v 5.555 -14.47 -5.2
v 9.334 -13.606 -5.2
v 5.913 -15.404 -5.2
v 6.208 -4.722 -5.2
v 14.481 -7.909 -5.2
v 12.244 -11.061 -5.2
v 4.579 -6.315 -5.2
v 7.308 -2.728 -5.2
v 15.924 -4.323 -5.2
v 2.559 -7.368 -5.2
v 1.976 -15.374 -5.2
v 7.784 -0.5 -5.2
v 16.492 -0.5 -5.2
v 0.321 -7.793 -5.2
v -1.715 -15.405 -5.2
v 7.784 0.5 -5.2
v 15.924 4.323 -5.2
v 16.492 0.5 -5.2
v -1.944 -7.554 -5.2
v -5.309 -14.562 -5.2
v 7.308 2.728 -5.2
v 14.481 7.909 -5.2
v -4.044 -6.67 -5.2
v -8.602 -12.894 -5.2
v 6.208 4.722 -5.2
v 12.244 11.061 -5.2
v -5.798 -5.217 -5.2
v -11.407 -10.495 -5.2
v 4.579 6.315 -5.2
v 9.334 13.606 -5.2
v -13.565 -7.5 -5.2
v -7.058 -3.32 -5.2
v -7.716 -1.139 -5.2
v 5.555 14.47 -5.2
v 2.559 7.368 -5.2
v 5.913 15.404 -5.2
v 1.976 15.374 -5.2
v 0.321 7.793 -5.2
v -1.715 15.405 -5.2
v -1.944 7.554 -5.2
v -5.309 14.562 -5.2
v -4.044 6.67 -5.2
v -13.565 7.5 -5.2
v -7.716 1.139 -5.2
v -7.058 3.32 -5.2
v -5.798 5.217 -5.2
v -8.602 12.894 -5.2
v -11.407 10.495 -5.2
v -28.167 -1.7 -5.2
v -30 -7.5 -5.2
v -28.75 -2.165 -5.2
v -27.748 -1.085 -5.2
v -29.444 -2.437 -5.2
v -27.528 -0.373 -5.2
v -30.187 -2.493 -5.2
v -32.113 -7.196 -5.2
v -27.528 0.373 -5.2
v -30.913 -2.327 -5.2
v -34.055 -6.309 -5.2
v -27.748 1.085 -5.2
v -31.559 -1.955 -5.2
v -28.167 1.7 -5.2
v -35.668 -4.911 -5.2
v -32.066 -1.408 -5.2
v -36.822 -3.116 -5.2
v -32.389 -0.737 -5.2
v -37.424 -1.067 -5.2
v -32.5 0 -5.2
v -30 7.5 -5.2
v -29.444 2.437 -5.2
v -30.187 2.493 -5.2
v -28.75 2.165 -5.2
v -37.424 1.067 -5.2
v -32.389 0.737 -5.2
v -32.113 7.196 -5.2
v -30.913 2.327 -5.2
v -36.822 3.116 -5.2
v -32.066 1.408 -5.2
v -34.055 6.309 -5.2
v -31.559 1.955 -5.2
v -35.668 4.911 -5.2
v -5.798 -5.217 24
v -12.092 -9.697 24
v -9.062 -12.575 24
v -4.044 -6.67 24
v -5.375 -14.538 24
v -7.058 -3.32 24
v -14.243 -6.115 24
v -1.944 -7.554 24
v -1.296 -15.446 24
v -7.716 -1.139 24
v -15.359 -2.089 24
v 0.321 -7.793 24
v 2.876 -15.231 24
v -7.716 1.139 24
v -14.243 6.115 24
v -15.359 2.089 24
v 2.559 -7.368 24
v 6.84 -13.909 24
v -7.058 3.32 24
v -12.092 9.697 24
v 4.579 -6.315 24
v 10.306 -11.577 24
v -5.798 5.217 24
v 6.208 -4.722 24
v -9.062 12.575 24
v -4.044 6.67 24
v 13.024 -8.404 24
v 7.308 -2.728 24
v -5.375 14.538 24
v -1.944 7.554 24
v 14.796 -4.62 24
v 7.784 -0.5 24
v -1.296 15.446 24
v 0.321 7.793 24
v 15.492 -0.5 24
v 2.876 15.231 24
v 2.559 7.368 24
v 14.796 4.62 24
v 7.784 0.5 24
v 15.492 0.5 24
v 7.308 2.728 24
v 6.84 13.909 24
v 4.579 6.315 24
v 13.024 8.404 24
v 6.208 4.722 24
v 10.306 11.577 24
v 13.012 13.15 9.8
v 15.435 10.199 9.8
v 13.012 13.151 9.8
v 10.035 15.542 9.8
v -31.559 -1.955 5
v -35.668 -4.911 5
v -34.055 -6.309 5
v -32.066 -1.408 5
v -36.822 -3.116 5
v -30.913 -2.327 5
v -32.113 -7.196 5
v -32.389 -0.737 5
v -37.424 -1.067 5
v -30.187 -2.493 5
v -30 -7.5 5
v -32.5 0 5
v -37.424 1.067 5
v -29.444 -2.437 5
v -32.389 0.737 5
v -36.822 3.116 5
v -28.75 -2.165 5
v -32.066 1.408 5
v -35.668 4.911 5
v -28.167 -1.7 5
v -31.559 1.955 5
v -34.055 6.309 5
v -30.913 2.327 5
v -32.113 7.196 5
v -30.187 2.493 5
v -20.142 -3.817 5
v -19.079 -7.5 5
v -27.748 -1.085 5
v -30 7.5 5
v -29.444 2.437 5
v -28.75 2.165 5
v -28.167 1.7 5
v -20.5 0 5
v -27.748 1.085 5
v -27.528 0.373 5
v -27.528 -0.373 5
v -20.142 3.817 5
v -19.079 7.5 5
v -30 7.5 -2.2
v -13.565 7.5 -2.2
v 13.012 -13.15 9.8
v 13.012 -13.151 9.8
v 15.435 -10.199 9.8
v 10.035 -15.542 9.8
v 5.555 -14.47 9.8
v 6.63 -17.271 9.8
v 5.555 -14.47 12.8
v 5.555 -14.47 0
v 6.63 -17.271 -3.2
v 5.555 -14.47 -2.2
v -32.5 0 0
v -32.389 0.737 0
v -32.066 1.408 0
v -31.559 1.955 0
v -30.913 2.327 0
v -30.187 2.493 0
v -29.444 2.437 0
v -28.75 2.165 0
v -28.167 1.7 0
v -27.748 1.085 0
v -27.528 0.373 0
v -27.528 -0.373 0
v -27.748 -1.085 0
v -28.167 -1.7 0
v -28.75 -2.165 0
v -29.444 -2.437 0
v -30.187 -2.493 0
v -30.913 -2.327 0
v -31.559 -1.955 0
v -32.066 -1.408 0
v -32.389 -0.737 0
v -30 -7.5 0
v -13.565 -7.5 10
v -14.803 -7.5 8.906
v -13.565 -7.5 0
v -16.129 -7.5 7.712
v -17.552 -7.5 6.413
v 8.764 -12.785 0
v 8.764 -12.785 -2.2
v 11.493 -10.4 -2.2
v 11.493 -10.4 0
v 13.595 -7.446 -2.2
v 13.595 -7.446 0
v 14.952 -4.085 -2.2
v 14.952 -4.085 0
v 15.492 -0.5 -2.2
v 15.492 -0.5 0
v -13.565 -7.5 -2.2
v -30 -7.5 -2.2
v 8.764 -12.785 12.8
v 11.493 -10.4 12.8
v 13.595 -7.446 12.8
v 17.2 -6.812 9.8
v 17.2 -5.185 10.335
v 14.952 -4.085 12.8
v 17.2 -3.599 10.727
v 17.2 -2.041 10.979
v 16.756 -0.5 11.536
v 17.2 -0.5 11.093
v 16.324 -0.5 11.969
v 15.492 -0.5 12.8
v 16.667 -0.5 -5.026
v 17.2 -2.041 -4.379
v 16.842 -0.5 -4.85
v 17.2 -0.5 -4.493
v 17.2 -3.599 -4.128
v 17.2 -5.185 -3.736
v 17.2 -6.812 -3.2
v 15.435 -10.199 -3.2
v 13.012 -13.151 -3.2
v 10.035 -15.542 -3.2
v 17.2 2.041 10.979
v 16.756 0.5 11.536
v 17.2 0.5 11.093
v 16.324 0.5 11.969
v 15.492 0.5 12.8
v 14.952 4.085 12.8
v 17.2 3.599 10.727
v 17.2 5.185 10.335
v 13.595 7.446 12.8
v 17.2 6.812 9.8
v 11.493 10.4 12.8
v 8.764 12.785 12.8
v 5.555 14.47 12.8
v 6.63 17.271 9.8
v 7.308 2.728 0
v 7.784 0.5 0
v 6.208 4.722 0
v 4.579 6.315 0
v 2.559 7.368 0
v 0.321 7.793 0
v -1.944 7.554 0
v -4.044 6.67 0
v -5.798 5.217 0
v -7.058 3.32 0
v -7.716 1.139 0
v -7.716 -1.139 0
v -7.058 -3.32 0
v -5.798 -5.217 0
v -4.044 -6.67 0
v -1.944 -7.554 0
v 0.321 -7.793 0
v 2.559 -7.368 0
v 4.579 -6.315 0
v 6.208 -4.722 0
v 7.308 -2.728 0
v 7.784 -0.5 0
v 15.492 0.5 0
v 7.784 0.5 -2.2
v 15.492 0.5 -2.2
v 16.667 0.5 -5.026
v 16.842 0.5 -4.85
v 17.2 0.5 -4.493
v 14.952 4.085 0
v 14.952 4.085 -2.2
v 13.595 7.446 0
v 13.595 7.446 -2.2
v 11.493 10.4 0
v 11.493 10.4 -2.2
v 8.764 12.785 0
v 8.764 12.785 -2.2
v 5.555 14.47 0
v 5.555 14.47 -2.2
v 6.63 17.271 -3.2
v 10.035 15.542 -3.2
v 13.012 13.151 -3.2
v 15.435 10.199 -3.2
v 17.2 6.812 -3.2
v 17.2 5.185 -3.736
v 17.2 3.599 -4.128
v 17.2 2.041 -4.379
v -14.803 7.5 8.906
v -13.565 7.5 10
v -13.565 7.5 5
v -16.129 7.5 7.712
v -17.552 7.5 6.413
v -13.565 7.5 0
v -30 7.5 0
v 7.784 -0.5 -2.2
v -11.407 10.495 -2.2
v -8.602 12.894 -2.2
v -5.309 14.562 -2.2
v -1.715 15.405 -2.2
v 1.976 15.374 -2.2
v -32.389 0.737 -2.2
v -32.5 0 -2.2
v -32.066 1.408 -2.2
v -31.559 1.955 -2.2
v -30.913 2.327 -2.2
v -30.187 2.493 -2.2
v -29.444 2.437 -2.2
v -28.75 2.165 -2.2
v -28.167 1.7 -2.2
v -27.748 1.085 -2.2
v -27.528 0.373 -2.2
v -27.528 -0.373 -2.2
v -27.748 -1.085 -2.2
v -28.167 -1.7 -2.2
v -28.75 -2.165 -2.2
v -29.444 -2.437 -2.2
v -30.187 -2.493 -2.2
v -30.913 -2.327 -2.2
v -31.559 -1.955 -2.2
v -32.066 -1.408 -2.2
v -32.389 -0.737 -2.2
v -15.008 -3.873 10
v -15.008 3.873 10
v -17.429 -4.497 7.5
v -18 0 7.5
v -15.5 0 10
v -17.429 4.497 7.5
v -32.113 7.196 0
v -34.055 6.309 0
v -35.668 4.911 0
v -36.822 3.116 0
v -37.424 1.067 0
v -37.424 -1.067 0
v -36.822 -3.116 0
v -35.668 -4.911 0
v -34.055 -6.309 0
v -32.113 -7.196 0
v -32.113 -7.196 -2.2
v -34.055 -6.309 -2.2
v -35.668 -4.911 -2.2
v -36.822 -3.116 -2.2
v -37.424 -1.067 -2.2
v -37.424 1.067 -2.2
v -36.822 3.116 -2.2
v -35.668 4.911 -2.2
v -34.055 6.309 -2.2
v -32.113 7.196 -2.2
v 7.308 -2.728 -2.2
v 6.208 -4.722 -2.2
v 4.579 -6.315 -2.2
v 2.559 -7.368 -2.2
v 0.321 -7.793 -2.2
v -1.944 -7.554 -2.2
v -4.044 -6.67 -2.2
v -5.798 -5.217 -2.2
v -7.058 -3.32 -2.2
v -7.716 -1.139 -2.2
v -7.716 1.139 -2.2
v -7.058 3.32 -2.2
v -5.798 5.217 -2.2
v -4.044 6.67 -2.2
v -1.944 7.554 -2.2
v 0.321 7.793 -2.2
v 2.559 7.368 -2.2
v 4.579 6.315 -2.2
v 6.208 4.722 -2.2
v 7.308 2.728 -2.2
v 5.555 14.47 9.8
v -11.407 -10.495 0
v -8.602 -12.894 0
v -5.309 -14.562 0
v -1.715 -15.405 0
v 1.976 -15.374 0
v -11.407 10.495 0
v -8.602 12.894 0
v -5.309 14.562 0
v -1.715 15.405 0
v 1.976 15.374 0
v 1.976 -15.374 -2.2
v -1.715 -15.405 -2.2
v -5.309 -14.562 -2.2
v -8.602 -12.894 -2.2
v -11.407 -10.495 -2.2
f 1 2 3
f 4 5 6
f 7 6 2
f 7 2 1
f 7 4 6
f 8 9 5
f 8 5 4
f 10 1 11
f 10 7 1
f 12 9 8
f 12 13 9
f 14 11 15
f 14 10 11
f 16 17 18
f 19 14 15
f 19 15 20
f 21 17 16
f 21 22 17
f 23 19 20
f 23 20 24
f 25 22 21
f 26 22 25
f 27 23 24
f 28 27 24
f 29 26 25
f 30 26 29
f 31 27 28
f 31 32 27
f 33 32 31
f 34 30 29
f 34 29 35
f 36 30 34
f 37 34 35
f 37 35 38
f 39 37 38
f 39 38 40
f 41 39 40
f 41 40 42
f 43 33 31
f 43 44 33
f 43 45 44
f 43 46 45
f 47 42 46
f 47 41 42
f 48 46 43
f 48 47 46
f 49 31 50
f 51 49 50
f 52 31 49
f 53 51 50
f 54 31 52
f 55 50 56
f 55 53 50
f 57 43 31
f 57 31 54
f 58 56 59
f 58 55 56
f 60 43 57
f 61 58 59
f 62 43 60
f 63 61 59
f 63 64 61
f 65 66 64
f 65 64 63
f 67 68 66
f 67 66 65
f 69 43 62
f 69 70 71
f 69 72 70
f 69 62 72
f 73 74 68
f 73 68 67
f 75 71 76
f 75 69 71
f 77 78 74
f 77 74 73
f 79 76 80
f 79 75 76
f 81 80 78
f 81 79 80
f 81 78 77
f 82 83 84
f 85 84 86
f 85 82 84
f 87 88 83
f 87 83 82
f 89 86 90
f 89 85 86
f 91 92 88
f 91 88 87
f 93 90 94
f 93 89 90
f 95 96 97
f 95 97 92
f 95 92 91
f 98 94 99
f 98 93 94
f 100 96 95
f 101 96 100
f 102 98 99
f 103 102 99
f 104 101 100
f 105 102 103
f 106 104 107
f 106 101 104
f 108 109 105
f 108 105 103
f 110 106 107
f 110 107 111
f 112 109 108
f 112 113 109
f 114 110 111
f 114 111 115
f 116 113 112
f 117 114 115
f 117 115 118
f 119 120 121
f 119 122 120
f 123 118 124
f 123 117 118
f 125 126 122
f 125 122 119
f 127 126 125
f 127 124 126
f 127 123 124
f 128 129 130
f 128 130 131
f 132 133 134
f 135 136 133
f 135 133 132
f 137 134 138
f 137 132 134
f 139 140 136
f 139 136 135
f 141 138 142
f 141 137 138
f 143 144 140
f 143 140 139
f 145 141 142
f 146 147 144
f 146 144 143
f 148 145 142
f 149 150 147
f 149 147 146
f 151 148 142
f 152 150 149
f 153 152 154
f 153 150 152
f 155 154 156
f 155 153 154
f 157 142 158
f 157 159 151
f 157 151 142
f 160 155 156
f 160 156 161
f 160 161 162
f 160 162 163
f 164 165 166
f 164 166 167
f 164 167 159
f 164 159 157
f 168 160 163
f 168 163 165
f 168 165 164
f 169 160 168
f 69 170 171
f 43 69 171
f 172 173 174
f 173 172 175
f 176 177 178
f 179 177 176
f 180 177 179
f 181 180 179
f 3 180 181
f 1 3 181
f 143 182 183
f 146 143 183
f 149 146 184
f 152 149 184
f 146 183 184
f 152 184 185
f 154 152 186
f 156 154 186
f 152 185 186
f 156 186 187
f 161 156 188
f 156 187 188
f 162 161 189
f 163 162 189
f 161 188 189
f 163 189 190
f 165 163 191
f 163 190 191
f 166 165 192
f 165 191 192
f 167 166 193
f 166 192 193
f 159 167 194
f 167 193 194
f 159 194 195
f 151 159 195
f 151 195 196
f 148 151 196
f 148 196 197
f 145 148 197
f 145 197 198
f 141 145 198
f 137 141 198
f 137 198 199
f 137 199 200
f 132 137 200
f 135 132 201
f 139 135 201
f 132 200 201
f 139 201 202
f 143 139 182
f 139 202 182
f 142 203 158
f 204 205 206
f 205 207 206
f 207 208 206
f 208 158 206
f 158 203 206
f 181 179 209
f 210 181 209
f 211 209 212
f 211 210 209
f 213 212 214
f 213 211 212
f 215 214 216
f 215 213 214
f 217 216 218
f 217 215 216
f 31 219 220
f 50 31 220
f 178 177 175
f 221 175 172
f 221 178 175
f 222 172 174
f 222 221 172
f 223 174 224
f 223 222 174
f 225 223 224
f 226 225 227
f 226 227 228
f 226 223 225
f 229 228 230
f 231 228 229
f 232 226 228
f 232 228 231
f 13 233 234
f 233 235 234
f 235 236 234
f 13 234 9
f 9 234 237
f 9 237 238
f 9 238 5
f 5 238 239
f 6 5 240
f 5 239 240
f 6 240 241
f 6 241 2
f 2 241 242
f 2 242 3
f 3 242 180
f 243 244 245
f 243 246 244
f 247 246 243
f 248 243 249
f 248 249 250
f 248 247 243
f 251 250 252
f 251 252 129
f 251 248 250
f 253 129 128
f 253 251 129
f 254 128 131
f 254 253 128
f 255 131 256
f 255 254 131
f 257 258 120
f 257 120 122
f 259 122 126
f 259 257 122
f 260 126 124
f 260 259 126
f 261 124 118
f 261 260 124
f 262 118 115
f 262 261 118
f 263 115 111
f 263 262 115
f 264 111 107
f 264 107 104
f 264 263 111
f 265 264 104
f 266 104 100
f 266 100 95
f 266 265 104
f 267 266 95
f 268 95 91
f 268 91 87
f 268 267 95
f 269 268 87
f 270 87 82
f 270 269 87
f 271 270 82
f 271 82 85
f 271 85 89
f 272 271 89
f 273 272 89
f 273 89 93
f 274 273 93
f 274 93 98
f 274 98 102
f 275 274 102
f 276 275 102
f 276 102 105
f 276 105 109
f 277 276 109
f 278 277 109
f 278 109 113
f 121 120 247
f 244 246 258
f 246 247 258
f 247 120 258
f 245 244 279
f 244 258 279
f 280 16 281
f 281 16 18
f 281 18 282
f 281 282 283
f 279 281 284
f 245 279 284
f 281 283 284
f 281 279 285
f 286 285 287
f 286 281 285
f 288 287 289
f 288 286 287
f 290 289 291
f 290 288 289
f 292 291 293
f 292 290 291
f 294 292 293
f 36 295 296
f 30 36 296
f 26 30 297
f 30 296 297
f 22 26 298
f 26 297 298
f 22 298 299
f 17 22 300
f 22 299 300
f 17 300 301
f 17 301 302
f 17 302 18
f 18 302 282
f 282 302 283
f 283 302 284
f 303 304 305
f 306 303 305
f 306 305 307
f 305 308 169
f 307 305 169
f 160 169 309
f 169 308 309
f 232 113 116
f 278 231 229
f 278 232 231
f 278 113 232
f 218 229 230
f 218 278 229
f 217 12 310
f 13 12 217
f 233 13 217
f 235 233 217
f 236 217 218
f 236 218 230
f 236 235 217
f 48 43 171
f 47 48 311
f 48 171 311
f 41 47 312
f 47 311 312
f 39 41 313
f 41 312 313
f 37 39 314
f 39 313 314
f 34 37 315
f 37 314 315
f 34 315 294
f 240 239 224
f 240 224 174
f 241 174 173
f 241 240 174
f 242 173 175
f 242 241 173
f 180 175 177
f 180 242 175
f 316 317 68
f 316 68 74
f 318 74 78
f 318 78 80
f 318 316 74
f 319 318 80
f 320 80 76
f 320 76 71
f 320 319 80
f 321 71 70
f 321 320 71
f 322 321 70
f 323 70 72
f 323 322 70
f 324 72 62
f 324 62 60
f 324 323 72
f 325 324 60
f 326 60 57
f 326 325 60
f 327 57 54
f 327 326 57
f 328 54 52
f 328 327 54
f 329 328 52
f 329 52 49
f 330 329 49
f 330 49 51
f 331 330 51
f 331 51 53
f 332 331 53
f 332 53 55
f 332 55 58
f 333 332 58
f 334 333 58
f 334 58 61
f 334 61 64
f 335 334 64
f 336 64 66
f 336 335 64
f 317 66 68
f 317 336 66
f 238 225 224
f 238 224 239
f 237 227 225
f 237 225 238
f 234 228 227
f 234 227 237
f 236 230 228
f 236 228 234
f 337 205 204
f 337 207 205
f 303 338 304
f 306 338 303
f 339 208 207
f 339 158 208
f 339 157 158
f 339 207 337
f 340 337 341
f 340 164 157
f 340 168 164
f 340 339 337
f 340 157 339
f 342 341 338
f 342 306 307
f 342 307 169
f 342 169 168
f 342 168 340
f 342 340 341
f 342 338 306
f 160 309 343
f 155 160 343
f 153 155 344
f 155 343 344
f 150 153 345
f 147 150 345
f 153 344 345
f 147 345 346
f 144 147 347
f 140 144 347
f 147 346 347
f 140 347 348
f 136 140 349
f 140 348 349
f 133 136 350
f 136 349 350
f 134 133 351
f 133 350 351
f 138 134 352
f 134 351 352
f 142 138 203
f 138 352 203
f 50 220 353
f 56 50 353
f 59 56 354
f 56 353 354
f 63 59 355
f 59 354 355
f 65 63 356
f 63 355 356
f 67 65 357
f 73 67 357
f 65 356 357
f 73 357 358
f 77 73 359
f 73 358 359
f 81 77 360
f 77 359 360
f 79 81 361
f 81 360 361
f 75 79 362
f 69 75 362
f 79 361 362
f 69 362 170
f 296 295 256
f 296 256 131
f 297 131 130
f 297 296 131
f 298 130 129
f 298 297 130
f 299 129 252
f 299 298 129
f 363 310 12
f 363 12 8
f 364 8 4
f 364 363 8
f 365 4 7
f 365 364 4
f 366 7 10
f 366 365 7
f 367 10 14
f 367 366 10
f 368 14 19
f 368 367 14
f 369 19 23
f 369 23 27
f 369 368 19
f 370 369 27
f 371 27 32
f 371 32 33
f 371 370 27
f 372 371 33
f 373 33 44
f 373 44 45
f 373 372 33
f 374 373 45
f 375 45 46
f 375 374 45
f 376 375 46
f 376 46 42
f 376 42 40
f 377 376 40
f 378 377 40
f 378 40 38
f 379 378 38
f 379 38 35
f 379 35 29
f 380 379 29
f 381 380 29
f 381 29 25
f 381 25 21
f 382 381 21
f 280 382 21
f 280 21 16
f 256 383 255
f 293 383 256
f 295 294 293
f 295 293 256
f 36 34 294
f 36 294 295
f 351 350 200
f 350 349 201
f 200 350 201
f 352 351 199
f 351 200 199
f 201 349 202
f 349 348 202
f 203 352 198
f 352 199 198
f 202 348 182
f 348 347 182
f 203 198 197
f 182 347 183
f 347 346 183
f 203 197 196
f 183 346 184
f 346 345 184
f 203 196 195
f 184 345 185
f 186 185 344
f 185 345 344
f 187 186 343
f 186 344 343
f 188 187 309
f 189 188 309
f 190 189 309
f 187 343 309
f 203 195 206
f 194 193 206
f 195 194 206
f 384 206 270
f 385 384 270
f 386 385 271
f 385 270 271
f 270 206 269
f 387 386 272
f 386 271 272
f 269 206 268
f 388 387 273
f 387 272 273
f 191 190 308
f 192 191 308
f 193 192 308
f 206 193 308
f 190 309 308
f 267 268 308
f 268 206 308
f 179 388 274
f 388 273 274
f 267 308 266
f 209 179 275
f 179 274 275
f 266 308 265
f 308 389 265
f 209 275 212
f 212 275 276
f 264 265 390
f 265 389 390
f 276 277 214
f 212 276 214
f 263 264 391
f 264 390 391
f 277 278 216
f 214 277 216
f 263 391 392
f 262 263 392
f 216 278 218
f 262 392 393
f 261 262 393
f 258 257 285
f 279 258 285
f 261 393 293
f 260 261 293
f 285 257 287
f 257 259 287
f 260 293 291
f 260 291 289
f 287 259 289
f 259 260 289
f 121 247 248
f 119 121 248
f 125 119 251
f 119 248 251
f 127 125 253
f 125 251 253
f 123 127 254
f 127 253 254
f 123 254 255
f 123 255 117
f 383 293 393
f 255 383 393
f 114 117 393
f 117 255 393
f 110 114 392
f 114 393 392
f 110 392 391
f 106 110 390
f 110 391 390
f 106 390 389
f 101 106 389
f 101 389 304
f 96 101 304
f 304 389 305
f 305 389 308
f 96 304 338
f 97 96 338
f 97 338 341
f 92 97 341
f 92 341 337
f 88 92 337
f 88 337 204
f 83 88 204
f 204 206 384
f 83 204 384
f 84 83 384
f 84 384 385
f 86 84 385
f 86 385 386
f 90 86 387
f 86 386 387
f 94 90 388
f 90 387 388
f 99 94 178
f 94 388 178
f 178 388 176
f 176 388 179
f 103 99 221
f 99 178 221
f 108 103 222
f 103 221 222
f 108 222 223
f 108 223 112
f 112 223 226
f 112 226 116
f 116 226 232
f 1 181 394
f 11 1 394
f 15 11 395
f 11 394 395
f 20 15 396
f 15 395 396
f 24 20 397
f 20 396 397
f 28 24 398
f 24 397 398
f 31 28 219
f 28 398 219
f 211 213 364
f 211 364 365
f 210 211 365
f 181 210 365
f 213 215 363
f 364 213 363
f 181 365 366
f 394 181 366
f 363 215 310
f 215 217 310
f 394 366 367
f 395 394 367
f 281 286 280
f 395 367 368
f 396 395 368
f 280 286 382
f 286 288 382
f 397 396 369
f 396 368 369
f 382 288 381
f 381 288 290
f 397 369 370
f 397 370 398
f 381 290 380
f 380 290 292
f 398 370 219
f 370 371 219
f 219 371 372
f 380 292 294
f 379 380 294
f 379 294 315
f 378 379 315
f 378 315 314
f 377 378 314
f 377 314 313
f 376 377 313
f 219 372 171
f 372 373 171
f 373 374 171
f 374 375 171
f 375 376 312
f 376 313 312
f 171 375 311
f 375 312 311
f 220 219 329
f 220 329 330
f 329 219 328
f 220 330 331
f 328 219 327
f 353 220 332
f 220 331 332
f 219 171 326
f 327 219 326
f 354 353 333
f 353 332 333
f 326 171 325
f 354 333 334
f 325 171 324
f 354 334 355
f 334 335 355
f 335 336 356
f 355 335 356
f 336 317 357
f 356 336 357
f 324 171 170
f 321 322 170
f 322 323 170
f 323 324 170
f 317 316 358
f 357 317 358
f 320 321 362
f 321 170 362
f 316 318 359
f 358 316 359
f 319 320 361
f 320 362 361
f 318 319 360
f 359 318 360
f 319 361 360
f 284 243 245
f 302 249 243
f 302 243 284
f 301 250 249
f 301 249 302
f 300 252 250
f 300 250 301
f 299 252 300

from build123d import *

# Parameters (mm, degrees)
SKETCH1_R                    = 15.5
SKETCH1_R_2                  = 7.8
BOSS_EXTRUDE1_DEPTH          = 24
SKETCH2_R                    = 2.5
SKETCH2_R_2                  = 7.8
BOSS_EXTRUDE2_DEPTH          = 5
SKETCH4_R                    = 2.5
SKETCH4_R_2                  = 7.8
BOSS_EXTRUDE3_DEPTH          = 3
BOSS_EXTRUDE4_DEPTH          = 15
CHAMFER1_SIZE                = 3
CHAMFER2_SIZE                = 2
CHAMFER3_SIZE                = 5
CUT_EXTRUDE_THIN1_DEPTH      = 51.568623258
CUT_EXTRUDE_THIN1_DEPTH_BACK = 50
SKETCH6_W                    = 28.833380518
SKETCH6_H                    = 1
SKETCH7_R                    = 32.954924651
CUT_EXTRUDE1_DEPTH           = 5


with BuildPart() as part:
    # Sketch1 → Boss-Extrude1 (new body)
    with BuildSketch(Plane.XY):
        Circle(SKETCH1_R)
        Circle(SKETCH1_R_2, mode=Mode.SUBTRACT)
    extrude(amount=BOSS_EXTRUDE1_DEPTH)

    # Sketch2 → Boss-Extrude2 (add)
    with BuildSketch(Plane(origin=(0, 0, 0), x_dir=(-1, 0, 0), z_dir=(0, 0, -1))):
        with BuildLine():
            Line((30, -7.5), (13.564659966, -7.5))
            ThreePointArc((13.564659966, -7.5), (-15.5, 0), (13.564659966, 7.5))
            Line((13.564659966, 7.5), (30, 7.5))
            ThreePointArc((30, 7.5), (37.5, 0), (30, -7.5))
        make_face()
        with Locations((30, 0)):
            Circle(SKETCH2_R, mode=Mode.SUBTRACT)
        with Locations(Location((0, 0, 0), (0, 0, 180))):
            Circle(SKETCH2_R_2, mode=Mode.SUBTRACT)
    extrude(amount=-BOSS_EXTRUDE2_DEPTH)



with BuildPart() as body_2:
    # Sketch4 → Boss-Extrude3 (new body)
    with BuildSketch(Plane(origin=(0, 0, -2.2), x_dir=(-1, 0, 0), z_dir=(0, 0, -1))):
        with BuildLine():
            Line((13.564659966, -7.5), (30, -7.5))
            ThreePointArc((30, -7.5), (37.5, 0), (30, 7.5))
            Line((30, 7.5), (13.564659966, 7.5))
            ThreePointArc((13.564659966, 7.5), (-15.5, 0), (13.564659966, -7.5))
        make_face()
        with Locations((30, 0)):
            Circle(SKETCH4_R, mode=Mode.SUBTRACT)
        with Locations(Location((0, 0, 0), (0, 0, 180))):
            Circle(SKETCH4_R_2, mode=Mode.SUBTRACT)
    extrude(amount=BOSS_EXTRUDE3_DEPTH)


with BuildPart() as part_1:
    add(part.part)

    add(body_2.part)  # Boss-Extrude4 merges body 2
    # Sketch5 → Boss-Extrude4 (add)
    with BuildSketch(Plane(origin=(0, 0, -5.2), x_dir=(-1, 0, 0), z_dir=(0, 0, -1))):
        with BuildLine():
            Line((-6.629807067, -17.27123789), (-5.554703218, -14.470496611))
            ThreePointArc((-5.554703218, -14.470496611), (-15.5, 0), (-5.554703218, 14.470496611))
            Line((-5.554703218, 14.470496611), (-6.629807067, 17.27123789))
            ThreePointArc((-6.629807067, 17.27123789), (-18.5, 0), (-6.629807067, -17.27123789))
        make_face()
    extrude(amount=-BOSS_EXTRUDE4_DEPTH)

    # Chamfer1
    chamfer1_edges = [part_1.edges().sort_by_distance(p)[0] for p in [
        (12.773955924, -8.779296672, 9.8),
    ]]
    chamfer(chamfer1_edges, length=CHAMFER1_SIZE - 0.0001)  # a hair under: the kernel refuses the full size

    # Chamfer2
    chamfer2_edges = [part_1.edges().sort_by_distance(p)[0] for p in [
        (18.5, 0, -5.2),
    ]]
    chamfer(chamfer2_edges, length=CHAMFER2_SIZE)

    # Chamfer3
    chamfer3_edges = [part_1.edges().sort_by_distance(p)[0] for p in [
        (-15.5, 0, 5),
    ]]
    chamfer(chamfer3_edges, length=CHAMFER3_SIZE)

    # Sketch6 → Cut-Extrude-Thin1 (cut, two sides: drawn at the far end of the back side and taken through both)
    with BuildSketch(Plane.XY.offset(24).offset(-CUT_EXTRUDE_THIN1_DEPTH_BACK)):
        with Locations((14.416690259, 0)):
            Rectangle(SKETCH6_W, SKETCH6_H)
    extrude(amount=CUT_EXTRUDE_THIN1_DEPTH + CUT_EXTRUDE_THIN1_DEPTH_BACK, mode=Mode.SUBTRACT)

    # Sketch7 → Cut-Extrude1 (cut)
    with BuildSketch(Plane(origin=(22.2, 0, 0), x_dir=(0, 0, -1), z_dir=(1, 0, 0))):
        with Locations((-8.942536343, 0)):
            Circle(SKETCH7_R)
    extrude(amount=-CUT_EXTRUDE1_DEPTH, mode=Mode.SUBTRACT)


solid = part_1.part
